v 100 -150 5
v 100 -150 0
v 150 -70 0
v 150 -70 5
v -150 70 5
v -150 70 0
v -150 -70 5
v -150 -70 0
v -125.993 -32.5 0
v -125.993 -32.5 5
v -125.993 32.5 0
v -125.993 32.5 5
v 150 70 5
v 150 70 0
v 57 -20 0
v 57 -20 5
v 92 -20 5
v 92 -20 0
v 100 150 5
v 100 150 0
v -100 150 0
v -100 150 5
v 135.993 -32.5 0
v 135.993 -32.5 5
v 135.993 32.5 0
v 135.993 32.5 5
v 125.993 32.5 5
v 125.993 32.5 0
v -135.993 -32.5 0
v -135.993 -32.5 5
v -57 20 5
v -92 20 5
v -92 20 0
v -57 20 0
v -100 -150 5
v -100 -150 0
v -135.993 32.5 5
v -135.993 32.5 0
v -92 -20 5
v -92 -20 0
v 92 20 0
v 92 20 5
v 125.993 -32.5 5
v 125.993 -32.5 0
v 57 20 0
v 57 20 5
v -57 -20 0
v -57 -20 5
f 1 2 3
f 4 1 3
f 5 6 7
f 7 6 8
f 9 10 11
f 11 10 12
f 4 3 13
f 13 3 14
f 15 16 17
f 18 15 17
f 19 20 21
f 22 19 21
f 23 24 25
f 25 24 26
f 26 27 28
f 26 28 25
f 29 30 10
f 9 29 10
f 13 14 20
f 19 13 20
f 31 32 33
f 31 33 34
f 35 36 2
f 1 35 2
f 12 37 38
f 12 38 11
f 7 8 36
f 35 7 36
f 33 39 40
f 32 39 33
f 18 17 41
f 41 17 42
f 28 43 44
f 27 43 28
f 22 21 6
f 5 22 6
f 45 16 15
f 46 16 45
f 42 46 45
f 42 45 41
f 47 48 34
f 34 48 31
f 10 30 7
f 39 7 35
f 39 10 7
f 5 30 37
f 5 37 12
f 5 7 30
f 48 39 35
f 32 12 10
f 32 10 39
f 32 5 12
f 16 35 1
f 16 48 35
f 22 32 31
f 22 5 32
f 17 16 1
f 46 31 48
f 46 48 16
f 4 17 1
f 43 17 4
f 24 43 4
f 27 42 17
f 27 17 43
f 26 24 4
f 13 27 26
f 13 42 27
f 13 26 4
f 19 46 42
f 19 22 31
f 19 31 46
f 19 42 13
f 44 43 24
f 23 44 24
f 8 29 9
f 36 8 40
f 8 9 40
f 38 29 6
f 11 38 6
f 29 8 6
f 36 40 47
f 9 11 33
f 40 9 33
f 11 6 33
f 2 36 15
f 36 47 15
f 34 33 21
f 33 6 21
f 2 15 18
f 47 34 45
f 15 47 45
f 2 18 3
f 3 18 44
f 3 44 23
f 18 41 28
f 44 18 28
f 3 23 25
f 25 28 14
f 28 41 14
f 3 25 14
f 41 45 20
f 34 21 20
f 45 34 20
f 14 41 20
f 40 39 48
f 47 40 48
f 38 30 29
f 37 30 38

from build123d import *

# Parameters (mm, degrees)
BOSS_EXTRU_1_DEPTH      = 5
ESQUISSE5_W             = 35
ESQUISSE5_H             = 40
ESQUISSE5_W_2           = 10
ESQUISSE5_H_2           = 65
ENL_V_MAT_EXTRU_1_DEPTH = 20


with BuildPart() as part:
    # Esquisse3 → Boss.-Extru.1 (new body)
    with BuildSketch(Plane.XY):
        Polygon((-100, 150), (-150, 70), (-150, -70), (-100, -150), (100, -150), (150, -70), (150, 70), (100, 150), align=None)
    extrude(amount=BOSS_EXTRU_1_DEPTH)

    # Esquisse5 → Enlèv. mat.-Extru.1 (cut)
    with BuildSketch(Plane.XY.offset(5)):
        with Locations((-74.5, 0)):
            Rectangle(ESQUISSE5_W, ESQUISSE5_H)
        with Locations((74.5, 0)):
            Rectangle(ESQUISSE5_W, ESQUISSE5_H)
        with Locations((-130.993475803, 0)):
            Rectangle(ESQUISSE5_W_2, ESQUISSE5_H_2)
        with Locations((130.993475803, 0)):
            Rectangle(ESQUISSE5_W_2, ESQUISSE5_H_2)
    extrude(amount=-ENL_V_MAT_EXTRU_1_DEPTH, mode=Mode.SUBTRACT)


solid = part.part
